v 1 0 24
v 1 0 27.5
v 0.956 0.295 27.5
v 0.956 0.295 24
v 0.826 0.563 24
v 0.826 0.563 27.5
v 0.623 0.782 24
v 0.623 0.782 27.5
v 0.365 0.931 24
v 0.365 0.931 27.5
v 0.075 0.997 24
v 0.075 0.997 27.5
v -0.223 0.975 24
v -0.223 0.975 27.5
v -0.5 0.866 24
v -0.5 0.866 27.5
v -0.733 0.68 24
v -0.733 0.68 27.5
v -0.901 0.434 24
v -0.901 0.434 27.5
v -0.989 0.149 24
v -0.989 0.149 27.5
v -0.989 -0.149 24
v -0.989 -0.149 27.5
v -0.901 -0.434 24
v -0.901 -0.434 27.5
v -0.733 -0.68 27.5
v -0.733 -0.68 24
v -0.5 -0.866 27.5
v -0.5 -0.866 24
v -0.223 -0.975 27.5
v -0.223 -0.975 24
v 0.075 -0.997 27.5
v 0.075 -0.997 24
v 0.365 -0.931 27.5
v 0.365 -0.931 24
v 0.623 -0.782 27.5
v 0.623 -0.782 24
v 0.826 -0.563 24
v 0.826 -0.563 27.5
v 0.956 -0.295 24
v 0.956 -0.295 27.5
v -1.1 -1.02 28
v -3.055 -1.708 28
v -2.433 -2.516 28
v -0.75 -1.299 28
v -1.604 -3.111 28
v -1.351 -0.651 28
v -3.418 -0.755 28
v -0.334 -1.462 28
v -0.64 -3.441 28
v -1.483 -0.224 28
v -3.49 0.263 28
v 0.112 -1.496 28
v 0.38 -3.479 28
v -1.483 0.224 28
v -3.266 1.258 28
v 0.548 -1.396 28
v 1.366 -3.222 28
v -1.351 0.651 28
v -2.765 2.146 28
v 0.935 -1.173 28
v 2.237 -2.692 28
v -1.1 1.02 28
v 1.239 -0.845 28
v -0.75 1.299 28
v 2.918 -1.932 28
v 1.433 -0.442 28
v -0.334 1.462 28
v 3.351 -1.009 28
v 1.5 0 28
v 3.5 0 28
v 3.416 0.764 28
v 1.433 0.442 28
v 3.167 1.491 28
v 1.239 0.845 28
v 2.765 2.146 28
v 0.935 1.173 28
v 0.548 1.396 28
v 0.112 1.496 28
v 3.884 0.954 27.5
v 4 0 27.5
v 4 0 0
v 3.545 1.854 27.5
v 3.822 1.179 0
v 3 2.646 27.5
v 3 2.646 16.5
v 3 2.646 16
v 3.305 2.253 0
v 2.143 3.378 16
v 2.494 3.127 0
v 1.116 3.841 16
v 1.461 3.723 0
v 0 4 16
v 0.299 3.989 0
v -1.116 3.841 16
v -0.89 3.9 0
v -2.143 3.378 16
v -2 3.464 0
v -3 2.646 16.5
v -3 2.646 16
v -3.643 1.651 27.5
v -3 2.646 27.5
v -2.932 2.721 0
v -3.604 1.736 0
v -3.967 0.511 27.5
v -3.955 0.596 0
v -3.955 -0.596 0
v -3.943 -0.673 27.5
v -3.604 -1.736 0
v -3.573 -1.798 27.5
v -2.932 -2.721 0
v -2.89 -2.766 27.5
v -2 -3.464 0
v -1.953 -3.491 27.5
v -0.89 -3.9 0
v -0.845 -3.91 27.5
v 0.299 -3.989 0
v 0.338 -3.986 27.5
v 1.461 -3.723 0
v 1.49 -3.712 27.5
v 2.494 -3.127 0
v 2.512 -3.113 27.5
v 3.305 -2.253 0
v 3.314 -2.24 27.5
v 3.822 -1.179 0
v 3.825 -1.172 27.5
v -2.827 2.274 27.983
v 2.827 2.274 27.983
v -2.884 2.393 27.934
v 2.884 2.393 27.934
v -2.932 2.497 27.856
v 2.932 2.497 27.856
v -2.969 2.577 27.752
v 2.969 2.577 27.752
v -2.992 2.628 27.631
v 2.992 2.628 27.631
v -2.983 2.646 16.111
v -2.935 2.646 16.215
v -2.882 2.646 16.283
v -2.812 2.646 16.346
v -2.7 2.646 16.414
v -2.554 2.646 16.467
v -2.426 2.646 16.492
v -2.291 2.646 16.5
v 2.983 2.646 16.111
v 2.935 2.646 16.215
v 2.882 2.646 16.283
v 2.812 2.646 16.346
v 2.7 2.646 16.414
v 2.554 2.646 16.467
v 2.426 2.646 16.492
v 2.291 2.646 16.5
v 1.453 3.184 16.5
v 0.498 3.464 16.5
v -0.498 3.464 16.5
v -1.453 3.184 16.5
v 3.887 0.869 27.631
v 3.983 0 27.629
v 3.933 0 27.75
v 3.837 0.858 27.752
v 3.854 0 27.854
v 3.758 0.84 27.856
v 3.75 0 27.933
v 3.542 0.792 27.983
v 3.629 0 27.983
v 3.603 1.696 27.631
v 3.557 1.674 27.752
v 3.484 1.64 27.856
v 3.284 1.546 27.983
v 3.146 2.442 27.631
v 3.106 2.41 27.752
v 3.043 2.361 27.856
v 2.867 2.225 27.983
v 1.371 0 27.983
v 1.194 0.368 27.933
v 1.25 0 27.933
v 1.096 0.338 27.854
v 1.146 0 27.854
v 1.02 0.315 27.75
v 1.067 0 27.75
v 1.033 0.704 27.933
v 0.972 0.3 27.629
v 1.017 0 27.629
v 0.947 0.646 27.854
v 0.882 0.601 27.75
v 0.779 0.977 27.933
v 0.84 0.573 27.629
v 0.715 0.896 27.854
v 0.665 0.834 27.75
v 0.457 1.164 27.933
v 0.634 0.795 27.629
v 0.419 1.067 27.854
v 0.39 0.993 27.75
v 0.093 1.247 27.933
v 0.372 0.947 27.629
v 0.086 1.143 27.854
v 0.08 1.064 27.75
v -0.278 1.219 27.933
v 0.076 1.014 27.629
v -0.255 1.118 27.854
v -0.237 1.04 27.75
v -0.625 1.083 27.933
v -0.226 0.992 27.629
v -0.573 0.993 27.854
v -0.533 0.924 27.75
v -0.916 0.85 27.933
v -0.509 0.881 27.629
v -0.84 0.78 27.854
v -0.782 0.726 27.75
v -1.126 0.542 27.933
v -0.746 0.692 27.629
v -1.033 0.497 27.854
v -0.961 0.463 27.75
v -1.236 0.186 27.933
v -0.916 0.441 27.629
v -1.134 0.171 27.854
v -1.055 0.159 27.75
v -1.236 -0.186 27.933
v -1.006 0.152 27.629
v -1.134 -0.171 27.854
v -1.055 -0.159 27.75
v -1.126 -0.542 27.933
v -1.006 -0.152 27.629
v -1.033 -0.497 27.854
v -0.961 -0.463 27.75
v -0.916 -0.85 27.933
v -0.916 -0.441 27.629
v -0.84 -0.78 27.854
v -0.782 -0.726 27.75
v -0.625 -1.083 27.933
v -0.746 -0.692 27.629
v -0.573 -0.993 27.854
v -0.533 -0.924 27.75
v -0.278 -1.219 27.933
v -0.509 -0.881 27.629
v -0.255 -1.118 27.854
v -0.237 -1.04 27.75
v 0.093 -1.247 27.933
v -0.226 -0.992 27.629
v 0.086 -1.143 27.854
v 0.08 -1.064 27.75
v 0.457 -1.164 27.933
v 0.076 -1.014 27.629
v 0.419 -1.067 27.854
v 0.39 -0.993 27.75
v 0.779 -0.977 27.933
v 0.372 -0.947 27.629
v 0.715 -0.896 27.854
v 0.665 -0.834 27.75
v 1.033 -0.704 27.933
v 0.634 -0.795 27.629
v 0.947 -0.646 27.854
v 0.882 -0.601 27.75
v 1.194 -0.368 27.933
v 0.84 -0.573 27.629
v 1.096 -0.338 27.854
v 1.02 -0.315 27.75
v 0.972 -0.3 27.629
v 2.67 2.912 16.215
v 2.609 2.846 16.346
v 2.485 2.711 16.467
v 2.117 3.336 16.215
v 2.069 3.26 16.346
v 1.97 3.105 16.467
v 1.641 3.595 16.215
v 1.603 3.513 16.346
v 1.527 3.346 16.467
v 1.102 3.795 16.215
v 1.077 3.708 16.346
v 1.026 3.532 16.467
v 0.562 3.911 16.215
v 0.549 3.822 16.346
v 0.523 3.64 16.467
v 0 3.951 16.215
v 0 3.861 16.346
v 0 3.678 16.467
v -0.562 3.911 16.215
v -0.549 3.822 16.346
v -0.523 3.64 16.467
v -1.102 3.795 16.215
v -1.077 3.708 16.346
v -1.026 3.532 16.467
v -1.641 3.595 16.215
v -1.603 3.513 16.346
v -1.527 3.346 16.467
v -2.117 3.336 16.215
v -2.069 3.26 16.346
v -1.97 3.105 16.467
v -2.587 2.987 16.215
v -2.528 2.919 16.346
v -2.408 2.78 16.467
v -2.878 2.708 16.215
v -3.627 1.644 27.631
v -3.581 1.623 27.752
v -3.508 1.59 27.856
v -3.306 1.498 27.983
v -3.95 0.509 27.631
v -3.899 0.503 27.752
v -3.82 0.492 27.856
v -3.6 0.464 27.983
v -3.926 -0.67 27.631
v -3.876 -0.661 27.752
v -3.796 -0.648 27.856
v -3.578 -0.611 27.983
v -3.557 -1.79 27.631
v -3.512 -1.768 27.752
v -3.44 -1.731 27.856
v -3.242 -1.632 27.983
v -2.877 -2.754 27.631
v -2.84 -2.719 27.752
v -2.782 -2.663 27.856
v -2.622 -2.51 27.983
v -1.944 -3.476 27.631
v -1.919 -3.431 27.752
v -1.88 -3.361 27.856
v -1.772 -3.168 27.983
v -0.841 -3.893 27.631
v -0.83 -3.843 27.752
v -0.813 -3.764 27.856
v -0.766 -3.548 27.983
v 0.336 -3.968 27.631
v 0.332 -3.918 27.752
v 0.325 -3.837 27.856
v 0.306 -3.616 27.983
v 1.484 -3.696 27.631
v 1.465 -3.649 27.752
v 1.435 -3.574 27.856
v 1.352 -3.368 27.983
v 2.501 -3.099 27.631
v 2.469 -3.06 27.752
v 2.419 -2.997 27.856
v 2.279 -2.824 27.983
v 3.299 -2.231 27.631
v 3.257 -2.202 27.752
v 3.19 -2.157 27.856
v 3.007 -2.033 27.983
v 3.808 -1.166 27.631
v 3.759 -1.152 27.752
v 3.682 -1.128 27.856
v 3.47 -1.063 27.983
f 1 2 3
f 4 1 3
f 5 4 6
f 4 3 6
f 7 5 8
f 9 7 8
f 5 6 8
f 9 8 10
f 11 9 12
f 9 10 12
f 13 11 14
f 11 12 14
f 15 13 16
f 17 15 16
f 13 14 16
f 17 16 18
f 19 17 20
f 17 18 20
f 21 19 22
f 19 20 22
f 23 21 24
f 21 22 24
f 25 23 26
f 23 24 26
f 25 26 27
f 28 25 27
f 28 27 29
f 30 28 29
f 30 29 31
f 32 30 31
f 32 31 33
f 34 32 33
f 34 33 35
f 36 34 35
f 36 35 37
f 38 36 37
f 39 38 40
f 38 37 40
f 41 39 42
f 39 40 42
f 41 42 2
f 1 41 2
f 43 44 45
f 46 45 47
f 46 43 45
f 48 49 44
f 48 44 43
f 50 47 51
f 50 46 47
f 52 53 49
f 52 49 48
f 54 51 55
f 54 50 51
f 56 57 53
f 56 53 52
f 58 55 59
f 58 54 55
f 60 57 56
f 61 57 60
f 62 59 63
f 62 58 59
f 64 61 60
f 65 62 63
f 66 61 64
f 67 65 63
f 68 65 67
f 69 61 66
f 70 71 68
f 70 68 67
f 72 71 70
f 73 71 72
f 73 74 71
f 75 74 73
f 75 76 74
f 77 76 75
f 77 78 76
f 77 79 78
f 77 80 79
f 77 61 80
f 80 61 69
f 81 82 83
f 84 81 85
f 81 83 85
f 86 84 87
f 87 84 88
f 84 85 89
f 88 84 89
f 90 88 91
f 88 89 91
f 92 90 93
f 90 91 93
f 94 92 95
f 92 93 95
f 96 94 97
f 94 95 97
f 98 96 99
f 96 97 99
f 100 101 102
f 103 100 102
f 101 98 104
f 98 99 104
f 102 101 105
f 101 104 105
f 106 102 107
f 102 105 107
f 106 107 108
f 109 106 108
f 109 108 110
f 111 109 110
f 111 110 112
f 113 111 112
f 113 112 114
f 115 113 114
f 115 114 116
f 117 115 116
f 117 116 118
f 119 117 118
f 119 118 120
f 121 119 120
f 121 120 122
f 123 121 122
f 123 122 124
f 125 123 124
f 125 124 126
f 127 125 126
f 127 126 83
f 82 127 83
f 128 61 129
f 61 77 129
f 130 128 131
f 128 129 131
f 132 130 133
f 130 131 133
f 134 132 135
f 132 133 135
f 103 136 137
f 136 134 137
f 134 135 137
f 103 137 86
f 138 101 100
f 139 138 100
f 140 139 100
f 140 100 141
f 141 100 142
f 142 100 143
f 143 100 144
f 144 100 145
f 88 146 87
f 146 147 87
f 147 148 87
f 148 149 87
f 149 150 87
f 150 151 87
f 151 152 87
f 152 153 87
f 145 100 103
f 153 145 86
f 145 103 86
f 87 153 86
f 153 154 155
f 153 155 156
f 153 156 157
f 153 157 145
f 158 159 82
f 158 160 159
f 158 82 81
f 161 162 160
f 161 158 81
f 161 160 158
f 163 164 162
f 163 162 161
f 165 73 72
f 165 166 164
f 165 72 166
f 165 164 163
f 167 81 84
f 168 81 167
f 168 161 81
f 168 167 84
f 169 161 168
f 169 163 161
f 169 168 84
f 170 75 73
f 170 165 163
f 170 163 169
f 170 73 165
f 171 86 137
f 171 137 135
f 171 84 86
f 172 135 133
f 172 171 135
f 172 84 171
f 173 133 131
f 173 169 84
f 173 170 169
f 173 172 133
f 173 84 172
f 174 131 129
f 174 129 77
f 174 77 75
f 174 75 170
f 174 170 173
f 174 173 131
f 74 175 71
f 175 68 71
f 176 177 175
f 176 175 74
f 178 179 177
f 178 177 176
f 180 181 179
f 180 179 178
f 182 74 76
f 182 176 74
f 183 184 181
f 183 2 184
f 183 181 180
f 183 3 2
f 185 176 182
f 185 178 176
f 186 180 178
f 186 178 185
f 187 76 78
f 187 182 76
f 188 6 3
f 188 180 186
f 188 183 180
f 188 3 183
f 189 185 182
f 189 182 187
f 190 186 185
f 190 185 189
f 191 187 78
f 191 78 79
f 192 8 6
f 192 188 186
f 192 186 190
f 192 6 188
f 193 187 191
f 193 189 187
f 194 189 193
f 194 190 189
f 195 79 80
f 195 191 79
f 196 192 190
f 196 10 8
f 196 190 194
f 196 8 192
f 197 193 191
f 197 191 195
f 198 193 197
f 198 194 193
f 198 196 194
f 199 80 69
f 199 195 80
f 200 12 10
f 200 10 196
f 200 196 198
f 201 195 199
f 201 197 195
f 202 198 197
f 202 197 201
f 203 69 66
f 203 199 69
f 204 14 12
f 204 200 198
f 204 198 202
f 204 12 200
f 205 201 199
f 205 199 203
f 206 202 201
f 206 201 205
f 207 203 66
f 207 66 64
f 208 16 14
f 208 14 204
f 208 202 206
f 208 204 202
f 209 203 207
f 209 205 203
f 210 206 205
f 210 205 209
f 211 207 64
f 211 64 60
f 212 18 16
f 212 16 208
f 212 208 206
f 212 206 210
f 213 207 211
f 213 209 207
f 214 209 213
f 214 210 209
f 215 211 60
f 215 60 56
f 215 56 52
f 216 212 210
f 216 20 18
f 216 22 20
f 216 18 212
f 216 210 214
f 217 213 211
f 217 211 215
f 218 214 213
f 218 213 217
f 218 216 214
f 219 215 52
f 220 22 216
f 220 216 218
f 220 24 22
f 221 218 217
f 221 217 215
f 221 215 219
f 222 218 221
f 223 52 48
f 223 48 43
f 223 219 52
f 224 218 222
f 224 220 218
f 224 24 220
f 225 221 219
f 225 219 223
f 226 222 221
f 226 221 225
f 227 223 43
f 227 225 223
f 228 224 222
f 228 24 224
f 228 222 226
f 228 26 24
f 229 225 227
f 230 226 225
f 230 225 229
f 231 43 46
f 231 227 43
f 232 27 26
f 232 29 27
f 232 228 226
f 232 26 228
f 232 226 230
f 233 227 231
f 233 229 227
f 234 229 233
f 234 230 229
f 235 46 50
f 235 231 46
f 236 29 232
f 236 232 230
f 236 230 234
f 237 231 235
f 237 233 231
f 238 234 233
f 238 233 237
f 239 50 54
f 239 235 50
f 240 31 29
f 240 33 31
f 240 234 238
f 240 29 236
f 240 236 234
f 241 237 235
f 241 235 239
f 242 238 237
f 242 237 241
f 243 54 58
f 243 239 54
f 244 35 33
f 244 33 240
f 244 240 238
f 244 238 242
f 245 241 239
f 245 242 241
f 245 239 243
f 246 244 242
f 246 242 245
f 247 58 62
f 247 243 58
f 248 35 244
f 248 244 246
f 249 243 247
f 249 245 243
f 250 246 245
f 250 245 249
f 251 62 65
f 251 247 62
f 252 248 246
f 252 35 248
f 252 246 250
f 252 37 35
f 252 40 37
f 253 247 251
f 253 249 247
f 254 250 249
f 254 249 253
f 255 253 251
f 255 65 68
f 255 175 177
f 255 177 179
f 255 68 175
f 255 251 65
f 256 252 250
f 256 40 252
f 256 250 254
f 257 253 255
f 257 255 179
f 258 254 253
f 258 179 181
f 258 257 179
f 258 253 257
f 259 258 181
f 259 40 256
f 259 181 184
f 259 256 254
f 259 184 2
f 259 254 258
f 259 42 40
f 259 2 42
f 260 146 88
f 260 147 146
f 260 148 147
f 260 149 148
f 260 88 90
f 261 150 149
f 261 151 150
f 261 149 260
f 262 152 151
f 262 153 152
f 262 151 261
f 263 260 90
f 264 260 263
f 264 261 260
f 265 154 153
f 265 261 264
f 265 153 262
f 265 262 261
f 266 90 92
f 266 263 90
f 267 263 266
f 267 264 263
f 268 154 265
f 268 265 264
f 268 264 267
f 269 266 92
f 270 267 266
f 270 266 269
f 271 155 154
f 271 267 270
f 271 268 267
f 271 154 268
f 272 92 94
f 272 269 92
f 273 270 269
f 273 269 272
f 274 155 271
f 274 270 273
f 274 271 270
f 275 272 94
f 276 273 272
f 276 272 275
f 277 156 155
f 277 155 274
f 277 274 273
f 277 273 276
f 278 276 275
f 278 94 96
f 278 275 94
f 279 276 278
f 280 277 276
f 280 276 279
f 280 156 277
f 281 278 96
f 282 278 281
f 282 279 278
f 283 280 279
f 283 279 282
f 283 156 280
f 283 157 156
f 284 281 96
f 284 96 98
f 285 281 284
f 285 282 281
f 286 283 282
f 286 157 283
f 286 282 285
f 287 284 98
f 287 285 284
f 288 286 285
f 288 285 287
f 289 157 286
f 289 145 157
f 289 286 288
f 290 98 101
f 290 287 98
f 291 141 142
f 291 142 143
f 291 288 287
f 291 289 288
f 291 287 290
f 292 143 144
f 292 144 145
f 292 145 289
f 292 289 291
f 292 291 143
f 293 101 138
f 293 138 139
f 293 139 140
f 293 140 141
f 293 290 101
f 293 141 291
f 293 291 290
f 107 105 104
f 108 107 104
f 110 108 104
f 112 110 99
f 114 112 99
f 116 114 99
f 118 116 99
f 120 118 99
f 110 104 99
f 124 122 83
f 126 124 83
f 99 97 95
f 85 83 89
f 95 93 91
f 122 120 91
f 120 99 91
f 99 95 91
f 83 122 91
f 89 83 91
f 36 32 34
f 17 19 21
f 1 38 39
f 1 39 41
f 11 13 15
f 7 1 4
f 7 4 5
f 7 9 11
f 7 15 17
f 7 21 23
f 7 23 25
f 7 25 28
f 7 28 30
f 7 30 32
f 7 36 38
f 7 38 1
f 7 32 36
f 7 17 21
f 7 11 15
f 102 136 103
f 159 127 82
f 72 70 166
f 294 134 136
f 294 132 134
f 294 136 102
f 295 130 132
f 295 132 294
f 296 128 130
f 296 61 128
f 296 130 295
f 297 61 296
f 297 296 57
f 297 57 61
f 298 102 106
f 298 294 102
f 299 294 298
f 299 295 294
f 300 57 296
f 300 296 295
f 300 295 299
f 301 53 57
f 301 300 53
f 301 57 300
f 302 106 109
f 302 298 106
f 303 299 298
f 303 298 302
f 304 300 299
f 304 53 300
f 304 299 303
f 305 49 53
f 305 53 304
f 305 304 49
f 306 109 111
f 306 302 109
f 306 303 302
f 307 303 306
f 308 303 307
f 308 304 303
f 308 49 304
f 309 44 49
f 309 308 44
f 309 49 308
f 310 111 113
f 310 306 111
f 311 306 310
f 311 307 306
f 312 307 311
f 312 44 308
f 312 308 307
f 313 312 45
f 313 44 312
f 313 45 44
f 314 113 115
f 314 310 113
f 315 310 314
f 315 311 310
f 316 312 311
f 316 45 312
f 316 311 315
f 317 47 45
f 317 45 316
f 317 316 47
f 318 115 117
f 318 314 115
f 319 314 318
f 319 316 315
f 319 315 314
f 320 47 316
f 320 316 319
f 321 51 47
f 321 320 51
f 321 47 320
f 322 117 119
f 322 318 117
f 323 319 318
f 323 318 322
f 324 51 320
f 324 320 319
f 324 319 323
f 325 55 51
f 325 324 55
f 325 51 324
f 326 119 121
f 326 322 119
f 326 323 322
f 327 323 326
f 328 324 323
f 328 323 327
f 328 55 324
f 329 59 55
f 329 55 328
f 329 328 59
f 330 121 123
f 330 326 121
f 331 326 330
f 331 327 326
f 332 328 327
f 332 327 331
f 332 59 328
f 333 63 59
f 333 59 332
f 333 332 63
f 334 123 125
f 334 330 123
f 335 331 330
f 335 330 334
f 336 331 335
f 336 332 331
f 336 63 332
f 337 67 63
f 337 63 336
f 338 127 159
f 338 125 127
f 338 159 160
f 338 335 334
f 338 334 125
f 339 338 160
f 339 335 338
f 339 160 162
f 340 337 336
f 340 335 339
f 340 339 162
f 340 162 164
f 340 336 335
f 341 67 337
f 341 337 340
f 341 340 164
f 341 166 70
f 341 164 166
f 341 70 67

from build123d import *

# Parameters (mm, degrees)
SKETCH1_R           = 4
BOSS_EXTRUDE1_DEPTH = 28
CUT_EXTRUDE1_DEPTH  = 11.5
SKETCH3_R           = 1
CUT_EXTRUDE2_DEPTH  = 4
FILLET1_R           = 0.5


with BuildPart() as part:
    # Sketch1 → Boss-Extrude1 (new body)
    with BuildSketch(Plane.XY):
        Circle(SKETCH1_R)
    extrude(amount=BOSS_EXTRUDE1_DEPTH)

    # Sketch2 → Cut-Extrude1 (cut)
    with BuildSketch(Plane.XY.offset(28)):
        with BuildLine():
            Line((-3, 2.645751311), (3, 2.645751311))
            ThreePointArc((3, 2.645751311), (0, 4), (-3, 2.645751311))
        make_face()
    extrude(amount=-CUT_EXTRUDE1_DEPTH, mode=Mode.SUBTRACT)

    # Sketch3 → Cut-Extrude2 (cut)
    with BuildSketch(Plane.XY.offset(28)):
        Circle(SKETCH3_R)
    extrude(amount=-CUT_EXTRUDE2_DEPTH, mode=Mode.SUBTRACT)

    # Fillet1
    fillet1_edges = [part.edges().sort_by_distance(p)[0] for p in [
        (-1, 0, 28),
        (-1.414213562, -3.741657387, 28),
        (0, 4, 16.5),
        (0, 2.645751311, 28),
    ]]
    fillet(fillet1_edges, radius=FILLET1_R)


solid = part.part
